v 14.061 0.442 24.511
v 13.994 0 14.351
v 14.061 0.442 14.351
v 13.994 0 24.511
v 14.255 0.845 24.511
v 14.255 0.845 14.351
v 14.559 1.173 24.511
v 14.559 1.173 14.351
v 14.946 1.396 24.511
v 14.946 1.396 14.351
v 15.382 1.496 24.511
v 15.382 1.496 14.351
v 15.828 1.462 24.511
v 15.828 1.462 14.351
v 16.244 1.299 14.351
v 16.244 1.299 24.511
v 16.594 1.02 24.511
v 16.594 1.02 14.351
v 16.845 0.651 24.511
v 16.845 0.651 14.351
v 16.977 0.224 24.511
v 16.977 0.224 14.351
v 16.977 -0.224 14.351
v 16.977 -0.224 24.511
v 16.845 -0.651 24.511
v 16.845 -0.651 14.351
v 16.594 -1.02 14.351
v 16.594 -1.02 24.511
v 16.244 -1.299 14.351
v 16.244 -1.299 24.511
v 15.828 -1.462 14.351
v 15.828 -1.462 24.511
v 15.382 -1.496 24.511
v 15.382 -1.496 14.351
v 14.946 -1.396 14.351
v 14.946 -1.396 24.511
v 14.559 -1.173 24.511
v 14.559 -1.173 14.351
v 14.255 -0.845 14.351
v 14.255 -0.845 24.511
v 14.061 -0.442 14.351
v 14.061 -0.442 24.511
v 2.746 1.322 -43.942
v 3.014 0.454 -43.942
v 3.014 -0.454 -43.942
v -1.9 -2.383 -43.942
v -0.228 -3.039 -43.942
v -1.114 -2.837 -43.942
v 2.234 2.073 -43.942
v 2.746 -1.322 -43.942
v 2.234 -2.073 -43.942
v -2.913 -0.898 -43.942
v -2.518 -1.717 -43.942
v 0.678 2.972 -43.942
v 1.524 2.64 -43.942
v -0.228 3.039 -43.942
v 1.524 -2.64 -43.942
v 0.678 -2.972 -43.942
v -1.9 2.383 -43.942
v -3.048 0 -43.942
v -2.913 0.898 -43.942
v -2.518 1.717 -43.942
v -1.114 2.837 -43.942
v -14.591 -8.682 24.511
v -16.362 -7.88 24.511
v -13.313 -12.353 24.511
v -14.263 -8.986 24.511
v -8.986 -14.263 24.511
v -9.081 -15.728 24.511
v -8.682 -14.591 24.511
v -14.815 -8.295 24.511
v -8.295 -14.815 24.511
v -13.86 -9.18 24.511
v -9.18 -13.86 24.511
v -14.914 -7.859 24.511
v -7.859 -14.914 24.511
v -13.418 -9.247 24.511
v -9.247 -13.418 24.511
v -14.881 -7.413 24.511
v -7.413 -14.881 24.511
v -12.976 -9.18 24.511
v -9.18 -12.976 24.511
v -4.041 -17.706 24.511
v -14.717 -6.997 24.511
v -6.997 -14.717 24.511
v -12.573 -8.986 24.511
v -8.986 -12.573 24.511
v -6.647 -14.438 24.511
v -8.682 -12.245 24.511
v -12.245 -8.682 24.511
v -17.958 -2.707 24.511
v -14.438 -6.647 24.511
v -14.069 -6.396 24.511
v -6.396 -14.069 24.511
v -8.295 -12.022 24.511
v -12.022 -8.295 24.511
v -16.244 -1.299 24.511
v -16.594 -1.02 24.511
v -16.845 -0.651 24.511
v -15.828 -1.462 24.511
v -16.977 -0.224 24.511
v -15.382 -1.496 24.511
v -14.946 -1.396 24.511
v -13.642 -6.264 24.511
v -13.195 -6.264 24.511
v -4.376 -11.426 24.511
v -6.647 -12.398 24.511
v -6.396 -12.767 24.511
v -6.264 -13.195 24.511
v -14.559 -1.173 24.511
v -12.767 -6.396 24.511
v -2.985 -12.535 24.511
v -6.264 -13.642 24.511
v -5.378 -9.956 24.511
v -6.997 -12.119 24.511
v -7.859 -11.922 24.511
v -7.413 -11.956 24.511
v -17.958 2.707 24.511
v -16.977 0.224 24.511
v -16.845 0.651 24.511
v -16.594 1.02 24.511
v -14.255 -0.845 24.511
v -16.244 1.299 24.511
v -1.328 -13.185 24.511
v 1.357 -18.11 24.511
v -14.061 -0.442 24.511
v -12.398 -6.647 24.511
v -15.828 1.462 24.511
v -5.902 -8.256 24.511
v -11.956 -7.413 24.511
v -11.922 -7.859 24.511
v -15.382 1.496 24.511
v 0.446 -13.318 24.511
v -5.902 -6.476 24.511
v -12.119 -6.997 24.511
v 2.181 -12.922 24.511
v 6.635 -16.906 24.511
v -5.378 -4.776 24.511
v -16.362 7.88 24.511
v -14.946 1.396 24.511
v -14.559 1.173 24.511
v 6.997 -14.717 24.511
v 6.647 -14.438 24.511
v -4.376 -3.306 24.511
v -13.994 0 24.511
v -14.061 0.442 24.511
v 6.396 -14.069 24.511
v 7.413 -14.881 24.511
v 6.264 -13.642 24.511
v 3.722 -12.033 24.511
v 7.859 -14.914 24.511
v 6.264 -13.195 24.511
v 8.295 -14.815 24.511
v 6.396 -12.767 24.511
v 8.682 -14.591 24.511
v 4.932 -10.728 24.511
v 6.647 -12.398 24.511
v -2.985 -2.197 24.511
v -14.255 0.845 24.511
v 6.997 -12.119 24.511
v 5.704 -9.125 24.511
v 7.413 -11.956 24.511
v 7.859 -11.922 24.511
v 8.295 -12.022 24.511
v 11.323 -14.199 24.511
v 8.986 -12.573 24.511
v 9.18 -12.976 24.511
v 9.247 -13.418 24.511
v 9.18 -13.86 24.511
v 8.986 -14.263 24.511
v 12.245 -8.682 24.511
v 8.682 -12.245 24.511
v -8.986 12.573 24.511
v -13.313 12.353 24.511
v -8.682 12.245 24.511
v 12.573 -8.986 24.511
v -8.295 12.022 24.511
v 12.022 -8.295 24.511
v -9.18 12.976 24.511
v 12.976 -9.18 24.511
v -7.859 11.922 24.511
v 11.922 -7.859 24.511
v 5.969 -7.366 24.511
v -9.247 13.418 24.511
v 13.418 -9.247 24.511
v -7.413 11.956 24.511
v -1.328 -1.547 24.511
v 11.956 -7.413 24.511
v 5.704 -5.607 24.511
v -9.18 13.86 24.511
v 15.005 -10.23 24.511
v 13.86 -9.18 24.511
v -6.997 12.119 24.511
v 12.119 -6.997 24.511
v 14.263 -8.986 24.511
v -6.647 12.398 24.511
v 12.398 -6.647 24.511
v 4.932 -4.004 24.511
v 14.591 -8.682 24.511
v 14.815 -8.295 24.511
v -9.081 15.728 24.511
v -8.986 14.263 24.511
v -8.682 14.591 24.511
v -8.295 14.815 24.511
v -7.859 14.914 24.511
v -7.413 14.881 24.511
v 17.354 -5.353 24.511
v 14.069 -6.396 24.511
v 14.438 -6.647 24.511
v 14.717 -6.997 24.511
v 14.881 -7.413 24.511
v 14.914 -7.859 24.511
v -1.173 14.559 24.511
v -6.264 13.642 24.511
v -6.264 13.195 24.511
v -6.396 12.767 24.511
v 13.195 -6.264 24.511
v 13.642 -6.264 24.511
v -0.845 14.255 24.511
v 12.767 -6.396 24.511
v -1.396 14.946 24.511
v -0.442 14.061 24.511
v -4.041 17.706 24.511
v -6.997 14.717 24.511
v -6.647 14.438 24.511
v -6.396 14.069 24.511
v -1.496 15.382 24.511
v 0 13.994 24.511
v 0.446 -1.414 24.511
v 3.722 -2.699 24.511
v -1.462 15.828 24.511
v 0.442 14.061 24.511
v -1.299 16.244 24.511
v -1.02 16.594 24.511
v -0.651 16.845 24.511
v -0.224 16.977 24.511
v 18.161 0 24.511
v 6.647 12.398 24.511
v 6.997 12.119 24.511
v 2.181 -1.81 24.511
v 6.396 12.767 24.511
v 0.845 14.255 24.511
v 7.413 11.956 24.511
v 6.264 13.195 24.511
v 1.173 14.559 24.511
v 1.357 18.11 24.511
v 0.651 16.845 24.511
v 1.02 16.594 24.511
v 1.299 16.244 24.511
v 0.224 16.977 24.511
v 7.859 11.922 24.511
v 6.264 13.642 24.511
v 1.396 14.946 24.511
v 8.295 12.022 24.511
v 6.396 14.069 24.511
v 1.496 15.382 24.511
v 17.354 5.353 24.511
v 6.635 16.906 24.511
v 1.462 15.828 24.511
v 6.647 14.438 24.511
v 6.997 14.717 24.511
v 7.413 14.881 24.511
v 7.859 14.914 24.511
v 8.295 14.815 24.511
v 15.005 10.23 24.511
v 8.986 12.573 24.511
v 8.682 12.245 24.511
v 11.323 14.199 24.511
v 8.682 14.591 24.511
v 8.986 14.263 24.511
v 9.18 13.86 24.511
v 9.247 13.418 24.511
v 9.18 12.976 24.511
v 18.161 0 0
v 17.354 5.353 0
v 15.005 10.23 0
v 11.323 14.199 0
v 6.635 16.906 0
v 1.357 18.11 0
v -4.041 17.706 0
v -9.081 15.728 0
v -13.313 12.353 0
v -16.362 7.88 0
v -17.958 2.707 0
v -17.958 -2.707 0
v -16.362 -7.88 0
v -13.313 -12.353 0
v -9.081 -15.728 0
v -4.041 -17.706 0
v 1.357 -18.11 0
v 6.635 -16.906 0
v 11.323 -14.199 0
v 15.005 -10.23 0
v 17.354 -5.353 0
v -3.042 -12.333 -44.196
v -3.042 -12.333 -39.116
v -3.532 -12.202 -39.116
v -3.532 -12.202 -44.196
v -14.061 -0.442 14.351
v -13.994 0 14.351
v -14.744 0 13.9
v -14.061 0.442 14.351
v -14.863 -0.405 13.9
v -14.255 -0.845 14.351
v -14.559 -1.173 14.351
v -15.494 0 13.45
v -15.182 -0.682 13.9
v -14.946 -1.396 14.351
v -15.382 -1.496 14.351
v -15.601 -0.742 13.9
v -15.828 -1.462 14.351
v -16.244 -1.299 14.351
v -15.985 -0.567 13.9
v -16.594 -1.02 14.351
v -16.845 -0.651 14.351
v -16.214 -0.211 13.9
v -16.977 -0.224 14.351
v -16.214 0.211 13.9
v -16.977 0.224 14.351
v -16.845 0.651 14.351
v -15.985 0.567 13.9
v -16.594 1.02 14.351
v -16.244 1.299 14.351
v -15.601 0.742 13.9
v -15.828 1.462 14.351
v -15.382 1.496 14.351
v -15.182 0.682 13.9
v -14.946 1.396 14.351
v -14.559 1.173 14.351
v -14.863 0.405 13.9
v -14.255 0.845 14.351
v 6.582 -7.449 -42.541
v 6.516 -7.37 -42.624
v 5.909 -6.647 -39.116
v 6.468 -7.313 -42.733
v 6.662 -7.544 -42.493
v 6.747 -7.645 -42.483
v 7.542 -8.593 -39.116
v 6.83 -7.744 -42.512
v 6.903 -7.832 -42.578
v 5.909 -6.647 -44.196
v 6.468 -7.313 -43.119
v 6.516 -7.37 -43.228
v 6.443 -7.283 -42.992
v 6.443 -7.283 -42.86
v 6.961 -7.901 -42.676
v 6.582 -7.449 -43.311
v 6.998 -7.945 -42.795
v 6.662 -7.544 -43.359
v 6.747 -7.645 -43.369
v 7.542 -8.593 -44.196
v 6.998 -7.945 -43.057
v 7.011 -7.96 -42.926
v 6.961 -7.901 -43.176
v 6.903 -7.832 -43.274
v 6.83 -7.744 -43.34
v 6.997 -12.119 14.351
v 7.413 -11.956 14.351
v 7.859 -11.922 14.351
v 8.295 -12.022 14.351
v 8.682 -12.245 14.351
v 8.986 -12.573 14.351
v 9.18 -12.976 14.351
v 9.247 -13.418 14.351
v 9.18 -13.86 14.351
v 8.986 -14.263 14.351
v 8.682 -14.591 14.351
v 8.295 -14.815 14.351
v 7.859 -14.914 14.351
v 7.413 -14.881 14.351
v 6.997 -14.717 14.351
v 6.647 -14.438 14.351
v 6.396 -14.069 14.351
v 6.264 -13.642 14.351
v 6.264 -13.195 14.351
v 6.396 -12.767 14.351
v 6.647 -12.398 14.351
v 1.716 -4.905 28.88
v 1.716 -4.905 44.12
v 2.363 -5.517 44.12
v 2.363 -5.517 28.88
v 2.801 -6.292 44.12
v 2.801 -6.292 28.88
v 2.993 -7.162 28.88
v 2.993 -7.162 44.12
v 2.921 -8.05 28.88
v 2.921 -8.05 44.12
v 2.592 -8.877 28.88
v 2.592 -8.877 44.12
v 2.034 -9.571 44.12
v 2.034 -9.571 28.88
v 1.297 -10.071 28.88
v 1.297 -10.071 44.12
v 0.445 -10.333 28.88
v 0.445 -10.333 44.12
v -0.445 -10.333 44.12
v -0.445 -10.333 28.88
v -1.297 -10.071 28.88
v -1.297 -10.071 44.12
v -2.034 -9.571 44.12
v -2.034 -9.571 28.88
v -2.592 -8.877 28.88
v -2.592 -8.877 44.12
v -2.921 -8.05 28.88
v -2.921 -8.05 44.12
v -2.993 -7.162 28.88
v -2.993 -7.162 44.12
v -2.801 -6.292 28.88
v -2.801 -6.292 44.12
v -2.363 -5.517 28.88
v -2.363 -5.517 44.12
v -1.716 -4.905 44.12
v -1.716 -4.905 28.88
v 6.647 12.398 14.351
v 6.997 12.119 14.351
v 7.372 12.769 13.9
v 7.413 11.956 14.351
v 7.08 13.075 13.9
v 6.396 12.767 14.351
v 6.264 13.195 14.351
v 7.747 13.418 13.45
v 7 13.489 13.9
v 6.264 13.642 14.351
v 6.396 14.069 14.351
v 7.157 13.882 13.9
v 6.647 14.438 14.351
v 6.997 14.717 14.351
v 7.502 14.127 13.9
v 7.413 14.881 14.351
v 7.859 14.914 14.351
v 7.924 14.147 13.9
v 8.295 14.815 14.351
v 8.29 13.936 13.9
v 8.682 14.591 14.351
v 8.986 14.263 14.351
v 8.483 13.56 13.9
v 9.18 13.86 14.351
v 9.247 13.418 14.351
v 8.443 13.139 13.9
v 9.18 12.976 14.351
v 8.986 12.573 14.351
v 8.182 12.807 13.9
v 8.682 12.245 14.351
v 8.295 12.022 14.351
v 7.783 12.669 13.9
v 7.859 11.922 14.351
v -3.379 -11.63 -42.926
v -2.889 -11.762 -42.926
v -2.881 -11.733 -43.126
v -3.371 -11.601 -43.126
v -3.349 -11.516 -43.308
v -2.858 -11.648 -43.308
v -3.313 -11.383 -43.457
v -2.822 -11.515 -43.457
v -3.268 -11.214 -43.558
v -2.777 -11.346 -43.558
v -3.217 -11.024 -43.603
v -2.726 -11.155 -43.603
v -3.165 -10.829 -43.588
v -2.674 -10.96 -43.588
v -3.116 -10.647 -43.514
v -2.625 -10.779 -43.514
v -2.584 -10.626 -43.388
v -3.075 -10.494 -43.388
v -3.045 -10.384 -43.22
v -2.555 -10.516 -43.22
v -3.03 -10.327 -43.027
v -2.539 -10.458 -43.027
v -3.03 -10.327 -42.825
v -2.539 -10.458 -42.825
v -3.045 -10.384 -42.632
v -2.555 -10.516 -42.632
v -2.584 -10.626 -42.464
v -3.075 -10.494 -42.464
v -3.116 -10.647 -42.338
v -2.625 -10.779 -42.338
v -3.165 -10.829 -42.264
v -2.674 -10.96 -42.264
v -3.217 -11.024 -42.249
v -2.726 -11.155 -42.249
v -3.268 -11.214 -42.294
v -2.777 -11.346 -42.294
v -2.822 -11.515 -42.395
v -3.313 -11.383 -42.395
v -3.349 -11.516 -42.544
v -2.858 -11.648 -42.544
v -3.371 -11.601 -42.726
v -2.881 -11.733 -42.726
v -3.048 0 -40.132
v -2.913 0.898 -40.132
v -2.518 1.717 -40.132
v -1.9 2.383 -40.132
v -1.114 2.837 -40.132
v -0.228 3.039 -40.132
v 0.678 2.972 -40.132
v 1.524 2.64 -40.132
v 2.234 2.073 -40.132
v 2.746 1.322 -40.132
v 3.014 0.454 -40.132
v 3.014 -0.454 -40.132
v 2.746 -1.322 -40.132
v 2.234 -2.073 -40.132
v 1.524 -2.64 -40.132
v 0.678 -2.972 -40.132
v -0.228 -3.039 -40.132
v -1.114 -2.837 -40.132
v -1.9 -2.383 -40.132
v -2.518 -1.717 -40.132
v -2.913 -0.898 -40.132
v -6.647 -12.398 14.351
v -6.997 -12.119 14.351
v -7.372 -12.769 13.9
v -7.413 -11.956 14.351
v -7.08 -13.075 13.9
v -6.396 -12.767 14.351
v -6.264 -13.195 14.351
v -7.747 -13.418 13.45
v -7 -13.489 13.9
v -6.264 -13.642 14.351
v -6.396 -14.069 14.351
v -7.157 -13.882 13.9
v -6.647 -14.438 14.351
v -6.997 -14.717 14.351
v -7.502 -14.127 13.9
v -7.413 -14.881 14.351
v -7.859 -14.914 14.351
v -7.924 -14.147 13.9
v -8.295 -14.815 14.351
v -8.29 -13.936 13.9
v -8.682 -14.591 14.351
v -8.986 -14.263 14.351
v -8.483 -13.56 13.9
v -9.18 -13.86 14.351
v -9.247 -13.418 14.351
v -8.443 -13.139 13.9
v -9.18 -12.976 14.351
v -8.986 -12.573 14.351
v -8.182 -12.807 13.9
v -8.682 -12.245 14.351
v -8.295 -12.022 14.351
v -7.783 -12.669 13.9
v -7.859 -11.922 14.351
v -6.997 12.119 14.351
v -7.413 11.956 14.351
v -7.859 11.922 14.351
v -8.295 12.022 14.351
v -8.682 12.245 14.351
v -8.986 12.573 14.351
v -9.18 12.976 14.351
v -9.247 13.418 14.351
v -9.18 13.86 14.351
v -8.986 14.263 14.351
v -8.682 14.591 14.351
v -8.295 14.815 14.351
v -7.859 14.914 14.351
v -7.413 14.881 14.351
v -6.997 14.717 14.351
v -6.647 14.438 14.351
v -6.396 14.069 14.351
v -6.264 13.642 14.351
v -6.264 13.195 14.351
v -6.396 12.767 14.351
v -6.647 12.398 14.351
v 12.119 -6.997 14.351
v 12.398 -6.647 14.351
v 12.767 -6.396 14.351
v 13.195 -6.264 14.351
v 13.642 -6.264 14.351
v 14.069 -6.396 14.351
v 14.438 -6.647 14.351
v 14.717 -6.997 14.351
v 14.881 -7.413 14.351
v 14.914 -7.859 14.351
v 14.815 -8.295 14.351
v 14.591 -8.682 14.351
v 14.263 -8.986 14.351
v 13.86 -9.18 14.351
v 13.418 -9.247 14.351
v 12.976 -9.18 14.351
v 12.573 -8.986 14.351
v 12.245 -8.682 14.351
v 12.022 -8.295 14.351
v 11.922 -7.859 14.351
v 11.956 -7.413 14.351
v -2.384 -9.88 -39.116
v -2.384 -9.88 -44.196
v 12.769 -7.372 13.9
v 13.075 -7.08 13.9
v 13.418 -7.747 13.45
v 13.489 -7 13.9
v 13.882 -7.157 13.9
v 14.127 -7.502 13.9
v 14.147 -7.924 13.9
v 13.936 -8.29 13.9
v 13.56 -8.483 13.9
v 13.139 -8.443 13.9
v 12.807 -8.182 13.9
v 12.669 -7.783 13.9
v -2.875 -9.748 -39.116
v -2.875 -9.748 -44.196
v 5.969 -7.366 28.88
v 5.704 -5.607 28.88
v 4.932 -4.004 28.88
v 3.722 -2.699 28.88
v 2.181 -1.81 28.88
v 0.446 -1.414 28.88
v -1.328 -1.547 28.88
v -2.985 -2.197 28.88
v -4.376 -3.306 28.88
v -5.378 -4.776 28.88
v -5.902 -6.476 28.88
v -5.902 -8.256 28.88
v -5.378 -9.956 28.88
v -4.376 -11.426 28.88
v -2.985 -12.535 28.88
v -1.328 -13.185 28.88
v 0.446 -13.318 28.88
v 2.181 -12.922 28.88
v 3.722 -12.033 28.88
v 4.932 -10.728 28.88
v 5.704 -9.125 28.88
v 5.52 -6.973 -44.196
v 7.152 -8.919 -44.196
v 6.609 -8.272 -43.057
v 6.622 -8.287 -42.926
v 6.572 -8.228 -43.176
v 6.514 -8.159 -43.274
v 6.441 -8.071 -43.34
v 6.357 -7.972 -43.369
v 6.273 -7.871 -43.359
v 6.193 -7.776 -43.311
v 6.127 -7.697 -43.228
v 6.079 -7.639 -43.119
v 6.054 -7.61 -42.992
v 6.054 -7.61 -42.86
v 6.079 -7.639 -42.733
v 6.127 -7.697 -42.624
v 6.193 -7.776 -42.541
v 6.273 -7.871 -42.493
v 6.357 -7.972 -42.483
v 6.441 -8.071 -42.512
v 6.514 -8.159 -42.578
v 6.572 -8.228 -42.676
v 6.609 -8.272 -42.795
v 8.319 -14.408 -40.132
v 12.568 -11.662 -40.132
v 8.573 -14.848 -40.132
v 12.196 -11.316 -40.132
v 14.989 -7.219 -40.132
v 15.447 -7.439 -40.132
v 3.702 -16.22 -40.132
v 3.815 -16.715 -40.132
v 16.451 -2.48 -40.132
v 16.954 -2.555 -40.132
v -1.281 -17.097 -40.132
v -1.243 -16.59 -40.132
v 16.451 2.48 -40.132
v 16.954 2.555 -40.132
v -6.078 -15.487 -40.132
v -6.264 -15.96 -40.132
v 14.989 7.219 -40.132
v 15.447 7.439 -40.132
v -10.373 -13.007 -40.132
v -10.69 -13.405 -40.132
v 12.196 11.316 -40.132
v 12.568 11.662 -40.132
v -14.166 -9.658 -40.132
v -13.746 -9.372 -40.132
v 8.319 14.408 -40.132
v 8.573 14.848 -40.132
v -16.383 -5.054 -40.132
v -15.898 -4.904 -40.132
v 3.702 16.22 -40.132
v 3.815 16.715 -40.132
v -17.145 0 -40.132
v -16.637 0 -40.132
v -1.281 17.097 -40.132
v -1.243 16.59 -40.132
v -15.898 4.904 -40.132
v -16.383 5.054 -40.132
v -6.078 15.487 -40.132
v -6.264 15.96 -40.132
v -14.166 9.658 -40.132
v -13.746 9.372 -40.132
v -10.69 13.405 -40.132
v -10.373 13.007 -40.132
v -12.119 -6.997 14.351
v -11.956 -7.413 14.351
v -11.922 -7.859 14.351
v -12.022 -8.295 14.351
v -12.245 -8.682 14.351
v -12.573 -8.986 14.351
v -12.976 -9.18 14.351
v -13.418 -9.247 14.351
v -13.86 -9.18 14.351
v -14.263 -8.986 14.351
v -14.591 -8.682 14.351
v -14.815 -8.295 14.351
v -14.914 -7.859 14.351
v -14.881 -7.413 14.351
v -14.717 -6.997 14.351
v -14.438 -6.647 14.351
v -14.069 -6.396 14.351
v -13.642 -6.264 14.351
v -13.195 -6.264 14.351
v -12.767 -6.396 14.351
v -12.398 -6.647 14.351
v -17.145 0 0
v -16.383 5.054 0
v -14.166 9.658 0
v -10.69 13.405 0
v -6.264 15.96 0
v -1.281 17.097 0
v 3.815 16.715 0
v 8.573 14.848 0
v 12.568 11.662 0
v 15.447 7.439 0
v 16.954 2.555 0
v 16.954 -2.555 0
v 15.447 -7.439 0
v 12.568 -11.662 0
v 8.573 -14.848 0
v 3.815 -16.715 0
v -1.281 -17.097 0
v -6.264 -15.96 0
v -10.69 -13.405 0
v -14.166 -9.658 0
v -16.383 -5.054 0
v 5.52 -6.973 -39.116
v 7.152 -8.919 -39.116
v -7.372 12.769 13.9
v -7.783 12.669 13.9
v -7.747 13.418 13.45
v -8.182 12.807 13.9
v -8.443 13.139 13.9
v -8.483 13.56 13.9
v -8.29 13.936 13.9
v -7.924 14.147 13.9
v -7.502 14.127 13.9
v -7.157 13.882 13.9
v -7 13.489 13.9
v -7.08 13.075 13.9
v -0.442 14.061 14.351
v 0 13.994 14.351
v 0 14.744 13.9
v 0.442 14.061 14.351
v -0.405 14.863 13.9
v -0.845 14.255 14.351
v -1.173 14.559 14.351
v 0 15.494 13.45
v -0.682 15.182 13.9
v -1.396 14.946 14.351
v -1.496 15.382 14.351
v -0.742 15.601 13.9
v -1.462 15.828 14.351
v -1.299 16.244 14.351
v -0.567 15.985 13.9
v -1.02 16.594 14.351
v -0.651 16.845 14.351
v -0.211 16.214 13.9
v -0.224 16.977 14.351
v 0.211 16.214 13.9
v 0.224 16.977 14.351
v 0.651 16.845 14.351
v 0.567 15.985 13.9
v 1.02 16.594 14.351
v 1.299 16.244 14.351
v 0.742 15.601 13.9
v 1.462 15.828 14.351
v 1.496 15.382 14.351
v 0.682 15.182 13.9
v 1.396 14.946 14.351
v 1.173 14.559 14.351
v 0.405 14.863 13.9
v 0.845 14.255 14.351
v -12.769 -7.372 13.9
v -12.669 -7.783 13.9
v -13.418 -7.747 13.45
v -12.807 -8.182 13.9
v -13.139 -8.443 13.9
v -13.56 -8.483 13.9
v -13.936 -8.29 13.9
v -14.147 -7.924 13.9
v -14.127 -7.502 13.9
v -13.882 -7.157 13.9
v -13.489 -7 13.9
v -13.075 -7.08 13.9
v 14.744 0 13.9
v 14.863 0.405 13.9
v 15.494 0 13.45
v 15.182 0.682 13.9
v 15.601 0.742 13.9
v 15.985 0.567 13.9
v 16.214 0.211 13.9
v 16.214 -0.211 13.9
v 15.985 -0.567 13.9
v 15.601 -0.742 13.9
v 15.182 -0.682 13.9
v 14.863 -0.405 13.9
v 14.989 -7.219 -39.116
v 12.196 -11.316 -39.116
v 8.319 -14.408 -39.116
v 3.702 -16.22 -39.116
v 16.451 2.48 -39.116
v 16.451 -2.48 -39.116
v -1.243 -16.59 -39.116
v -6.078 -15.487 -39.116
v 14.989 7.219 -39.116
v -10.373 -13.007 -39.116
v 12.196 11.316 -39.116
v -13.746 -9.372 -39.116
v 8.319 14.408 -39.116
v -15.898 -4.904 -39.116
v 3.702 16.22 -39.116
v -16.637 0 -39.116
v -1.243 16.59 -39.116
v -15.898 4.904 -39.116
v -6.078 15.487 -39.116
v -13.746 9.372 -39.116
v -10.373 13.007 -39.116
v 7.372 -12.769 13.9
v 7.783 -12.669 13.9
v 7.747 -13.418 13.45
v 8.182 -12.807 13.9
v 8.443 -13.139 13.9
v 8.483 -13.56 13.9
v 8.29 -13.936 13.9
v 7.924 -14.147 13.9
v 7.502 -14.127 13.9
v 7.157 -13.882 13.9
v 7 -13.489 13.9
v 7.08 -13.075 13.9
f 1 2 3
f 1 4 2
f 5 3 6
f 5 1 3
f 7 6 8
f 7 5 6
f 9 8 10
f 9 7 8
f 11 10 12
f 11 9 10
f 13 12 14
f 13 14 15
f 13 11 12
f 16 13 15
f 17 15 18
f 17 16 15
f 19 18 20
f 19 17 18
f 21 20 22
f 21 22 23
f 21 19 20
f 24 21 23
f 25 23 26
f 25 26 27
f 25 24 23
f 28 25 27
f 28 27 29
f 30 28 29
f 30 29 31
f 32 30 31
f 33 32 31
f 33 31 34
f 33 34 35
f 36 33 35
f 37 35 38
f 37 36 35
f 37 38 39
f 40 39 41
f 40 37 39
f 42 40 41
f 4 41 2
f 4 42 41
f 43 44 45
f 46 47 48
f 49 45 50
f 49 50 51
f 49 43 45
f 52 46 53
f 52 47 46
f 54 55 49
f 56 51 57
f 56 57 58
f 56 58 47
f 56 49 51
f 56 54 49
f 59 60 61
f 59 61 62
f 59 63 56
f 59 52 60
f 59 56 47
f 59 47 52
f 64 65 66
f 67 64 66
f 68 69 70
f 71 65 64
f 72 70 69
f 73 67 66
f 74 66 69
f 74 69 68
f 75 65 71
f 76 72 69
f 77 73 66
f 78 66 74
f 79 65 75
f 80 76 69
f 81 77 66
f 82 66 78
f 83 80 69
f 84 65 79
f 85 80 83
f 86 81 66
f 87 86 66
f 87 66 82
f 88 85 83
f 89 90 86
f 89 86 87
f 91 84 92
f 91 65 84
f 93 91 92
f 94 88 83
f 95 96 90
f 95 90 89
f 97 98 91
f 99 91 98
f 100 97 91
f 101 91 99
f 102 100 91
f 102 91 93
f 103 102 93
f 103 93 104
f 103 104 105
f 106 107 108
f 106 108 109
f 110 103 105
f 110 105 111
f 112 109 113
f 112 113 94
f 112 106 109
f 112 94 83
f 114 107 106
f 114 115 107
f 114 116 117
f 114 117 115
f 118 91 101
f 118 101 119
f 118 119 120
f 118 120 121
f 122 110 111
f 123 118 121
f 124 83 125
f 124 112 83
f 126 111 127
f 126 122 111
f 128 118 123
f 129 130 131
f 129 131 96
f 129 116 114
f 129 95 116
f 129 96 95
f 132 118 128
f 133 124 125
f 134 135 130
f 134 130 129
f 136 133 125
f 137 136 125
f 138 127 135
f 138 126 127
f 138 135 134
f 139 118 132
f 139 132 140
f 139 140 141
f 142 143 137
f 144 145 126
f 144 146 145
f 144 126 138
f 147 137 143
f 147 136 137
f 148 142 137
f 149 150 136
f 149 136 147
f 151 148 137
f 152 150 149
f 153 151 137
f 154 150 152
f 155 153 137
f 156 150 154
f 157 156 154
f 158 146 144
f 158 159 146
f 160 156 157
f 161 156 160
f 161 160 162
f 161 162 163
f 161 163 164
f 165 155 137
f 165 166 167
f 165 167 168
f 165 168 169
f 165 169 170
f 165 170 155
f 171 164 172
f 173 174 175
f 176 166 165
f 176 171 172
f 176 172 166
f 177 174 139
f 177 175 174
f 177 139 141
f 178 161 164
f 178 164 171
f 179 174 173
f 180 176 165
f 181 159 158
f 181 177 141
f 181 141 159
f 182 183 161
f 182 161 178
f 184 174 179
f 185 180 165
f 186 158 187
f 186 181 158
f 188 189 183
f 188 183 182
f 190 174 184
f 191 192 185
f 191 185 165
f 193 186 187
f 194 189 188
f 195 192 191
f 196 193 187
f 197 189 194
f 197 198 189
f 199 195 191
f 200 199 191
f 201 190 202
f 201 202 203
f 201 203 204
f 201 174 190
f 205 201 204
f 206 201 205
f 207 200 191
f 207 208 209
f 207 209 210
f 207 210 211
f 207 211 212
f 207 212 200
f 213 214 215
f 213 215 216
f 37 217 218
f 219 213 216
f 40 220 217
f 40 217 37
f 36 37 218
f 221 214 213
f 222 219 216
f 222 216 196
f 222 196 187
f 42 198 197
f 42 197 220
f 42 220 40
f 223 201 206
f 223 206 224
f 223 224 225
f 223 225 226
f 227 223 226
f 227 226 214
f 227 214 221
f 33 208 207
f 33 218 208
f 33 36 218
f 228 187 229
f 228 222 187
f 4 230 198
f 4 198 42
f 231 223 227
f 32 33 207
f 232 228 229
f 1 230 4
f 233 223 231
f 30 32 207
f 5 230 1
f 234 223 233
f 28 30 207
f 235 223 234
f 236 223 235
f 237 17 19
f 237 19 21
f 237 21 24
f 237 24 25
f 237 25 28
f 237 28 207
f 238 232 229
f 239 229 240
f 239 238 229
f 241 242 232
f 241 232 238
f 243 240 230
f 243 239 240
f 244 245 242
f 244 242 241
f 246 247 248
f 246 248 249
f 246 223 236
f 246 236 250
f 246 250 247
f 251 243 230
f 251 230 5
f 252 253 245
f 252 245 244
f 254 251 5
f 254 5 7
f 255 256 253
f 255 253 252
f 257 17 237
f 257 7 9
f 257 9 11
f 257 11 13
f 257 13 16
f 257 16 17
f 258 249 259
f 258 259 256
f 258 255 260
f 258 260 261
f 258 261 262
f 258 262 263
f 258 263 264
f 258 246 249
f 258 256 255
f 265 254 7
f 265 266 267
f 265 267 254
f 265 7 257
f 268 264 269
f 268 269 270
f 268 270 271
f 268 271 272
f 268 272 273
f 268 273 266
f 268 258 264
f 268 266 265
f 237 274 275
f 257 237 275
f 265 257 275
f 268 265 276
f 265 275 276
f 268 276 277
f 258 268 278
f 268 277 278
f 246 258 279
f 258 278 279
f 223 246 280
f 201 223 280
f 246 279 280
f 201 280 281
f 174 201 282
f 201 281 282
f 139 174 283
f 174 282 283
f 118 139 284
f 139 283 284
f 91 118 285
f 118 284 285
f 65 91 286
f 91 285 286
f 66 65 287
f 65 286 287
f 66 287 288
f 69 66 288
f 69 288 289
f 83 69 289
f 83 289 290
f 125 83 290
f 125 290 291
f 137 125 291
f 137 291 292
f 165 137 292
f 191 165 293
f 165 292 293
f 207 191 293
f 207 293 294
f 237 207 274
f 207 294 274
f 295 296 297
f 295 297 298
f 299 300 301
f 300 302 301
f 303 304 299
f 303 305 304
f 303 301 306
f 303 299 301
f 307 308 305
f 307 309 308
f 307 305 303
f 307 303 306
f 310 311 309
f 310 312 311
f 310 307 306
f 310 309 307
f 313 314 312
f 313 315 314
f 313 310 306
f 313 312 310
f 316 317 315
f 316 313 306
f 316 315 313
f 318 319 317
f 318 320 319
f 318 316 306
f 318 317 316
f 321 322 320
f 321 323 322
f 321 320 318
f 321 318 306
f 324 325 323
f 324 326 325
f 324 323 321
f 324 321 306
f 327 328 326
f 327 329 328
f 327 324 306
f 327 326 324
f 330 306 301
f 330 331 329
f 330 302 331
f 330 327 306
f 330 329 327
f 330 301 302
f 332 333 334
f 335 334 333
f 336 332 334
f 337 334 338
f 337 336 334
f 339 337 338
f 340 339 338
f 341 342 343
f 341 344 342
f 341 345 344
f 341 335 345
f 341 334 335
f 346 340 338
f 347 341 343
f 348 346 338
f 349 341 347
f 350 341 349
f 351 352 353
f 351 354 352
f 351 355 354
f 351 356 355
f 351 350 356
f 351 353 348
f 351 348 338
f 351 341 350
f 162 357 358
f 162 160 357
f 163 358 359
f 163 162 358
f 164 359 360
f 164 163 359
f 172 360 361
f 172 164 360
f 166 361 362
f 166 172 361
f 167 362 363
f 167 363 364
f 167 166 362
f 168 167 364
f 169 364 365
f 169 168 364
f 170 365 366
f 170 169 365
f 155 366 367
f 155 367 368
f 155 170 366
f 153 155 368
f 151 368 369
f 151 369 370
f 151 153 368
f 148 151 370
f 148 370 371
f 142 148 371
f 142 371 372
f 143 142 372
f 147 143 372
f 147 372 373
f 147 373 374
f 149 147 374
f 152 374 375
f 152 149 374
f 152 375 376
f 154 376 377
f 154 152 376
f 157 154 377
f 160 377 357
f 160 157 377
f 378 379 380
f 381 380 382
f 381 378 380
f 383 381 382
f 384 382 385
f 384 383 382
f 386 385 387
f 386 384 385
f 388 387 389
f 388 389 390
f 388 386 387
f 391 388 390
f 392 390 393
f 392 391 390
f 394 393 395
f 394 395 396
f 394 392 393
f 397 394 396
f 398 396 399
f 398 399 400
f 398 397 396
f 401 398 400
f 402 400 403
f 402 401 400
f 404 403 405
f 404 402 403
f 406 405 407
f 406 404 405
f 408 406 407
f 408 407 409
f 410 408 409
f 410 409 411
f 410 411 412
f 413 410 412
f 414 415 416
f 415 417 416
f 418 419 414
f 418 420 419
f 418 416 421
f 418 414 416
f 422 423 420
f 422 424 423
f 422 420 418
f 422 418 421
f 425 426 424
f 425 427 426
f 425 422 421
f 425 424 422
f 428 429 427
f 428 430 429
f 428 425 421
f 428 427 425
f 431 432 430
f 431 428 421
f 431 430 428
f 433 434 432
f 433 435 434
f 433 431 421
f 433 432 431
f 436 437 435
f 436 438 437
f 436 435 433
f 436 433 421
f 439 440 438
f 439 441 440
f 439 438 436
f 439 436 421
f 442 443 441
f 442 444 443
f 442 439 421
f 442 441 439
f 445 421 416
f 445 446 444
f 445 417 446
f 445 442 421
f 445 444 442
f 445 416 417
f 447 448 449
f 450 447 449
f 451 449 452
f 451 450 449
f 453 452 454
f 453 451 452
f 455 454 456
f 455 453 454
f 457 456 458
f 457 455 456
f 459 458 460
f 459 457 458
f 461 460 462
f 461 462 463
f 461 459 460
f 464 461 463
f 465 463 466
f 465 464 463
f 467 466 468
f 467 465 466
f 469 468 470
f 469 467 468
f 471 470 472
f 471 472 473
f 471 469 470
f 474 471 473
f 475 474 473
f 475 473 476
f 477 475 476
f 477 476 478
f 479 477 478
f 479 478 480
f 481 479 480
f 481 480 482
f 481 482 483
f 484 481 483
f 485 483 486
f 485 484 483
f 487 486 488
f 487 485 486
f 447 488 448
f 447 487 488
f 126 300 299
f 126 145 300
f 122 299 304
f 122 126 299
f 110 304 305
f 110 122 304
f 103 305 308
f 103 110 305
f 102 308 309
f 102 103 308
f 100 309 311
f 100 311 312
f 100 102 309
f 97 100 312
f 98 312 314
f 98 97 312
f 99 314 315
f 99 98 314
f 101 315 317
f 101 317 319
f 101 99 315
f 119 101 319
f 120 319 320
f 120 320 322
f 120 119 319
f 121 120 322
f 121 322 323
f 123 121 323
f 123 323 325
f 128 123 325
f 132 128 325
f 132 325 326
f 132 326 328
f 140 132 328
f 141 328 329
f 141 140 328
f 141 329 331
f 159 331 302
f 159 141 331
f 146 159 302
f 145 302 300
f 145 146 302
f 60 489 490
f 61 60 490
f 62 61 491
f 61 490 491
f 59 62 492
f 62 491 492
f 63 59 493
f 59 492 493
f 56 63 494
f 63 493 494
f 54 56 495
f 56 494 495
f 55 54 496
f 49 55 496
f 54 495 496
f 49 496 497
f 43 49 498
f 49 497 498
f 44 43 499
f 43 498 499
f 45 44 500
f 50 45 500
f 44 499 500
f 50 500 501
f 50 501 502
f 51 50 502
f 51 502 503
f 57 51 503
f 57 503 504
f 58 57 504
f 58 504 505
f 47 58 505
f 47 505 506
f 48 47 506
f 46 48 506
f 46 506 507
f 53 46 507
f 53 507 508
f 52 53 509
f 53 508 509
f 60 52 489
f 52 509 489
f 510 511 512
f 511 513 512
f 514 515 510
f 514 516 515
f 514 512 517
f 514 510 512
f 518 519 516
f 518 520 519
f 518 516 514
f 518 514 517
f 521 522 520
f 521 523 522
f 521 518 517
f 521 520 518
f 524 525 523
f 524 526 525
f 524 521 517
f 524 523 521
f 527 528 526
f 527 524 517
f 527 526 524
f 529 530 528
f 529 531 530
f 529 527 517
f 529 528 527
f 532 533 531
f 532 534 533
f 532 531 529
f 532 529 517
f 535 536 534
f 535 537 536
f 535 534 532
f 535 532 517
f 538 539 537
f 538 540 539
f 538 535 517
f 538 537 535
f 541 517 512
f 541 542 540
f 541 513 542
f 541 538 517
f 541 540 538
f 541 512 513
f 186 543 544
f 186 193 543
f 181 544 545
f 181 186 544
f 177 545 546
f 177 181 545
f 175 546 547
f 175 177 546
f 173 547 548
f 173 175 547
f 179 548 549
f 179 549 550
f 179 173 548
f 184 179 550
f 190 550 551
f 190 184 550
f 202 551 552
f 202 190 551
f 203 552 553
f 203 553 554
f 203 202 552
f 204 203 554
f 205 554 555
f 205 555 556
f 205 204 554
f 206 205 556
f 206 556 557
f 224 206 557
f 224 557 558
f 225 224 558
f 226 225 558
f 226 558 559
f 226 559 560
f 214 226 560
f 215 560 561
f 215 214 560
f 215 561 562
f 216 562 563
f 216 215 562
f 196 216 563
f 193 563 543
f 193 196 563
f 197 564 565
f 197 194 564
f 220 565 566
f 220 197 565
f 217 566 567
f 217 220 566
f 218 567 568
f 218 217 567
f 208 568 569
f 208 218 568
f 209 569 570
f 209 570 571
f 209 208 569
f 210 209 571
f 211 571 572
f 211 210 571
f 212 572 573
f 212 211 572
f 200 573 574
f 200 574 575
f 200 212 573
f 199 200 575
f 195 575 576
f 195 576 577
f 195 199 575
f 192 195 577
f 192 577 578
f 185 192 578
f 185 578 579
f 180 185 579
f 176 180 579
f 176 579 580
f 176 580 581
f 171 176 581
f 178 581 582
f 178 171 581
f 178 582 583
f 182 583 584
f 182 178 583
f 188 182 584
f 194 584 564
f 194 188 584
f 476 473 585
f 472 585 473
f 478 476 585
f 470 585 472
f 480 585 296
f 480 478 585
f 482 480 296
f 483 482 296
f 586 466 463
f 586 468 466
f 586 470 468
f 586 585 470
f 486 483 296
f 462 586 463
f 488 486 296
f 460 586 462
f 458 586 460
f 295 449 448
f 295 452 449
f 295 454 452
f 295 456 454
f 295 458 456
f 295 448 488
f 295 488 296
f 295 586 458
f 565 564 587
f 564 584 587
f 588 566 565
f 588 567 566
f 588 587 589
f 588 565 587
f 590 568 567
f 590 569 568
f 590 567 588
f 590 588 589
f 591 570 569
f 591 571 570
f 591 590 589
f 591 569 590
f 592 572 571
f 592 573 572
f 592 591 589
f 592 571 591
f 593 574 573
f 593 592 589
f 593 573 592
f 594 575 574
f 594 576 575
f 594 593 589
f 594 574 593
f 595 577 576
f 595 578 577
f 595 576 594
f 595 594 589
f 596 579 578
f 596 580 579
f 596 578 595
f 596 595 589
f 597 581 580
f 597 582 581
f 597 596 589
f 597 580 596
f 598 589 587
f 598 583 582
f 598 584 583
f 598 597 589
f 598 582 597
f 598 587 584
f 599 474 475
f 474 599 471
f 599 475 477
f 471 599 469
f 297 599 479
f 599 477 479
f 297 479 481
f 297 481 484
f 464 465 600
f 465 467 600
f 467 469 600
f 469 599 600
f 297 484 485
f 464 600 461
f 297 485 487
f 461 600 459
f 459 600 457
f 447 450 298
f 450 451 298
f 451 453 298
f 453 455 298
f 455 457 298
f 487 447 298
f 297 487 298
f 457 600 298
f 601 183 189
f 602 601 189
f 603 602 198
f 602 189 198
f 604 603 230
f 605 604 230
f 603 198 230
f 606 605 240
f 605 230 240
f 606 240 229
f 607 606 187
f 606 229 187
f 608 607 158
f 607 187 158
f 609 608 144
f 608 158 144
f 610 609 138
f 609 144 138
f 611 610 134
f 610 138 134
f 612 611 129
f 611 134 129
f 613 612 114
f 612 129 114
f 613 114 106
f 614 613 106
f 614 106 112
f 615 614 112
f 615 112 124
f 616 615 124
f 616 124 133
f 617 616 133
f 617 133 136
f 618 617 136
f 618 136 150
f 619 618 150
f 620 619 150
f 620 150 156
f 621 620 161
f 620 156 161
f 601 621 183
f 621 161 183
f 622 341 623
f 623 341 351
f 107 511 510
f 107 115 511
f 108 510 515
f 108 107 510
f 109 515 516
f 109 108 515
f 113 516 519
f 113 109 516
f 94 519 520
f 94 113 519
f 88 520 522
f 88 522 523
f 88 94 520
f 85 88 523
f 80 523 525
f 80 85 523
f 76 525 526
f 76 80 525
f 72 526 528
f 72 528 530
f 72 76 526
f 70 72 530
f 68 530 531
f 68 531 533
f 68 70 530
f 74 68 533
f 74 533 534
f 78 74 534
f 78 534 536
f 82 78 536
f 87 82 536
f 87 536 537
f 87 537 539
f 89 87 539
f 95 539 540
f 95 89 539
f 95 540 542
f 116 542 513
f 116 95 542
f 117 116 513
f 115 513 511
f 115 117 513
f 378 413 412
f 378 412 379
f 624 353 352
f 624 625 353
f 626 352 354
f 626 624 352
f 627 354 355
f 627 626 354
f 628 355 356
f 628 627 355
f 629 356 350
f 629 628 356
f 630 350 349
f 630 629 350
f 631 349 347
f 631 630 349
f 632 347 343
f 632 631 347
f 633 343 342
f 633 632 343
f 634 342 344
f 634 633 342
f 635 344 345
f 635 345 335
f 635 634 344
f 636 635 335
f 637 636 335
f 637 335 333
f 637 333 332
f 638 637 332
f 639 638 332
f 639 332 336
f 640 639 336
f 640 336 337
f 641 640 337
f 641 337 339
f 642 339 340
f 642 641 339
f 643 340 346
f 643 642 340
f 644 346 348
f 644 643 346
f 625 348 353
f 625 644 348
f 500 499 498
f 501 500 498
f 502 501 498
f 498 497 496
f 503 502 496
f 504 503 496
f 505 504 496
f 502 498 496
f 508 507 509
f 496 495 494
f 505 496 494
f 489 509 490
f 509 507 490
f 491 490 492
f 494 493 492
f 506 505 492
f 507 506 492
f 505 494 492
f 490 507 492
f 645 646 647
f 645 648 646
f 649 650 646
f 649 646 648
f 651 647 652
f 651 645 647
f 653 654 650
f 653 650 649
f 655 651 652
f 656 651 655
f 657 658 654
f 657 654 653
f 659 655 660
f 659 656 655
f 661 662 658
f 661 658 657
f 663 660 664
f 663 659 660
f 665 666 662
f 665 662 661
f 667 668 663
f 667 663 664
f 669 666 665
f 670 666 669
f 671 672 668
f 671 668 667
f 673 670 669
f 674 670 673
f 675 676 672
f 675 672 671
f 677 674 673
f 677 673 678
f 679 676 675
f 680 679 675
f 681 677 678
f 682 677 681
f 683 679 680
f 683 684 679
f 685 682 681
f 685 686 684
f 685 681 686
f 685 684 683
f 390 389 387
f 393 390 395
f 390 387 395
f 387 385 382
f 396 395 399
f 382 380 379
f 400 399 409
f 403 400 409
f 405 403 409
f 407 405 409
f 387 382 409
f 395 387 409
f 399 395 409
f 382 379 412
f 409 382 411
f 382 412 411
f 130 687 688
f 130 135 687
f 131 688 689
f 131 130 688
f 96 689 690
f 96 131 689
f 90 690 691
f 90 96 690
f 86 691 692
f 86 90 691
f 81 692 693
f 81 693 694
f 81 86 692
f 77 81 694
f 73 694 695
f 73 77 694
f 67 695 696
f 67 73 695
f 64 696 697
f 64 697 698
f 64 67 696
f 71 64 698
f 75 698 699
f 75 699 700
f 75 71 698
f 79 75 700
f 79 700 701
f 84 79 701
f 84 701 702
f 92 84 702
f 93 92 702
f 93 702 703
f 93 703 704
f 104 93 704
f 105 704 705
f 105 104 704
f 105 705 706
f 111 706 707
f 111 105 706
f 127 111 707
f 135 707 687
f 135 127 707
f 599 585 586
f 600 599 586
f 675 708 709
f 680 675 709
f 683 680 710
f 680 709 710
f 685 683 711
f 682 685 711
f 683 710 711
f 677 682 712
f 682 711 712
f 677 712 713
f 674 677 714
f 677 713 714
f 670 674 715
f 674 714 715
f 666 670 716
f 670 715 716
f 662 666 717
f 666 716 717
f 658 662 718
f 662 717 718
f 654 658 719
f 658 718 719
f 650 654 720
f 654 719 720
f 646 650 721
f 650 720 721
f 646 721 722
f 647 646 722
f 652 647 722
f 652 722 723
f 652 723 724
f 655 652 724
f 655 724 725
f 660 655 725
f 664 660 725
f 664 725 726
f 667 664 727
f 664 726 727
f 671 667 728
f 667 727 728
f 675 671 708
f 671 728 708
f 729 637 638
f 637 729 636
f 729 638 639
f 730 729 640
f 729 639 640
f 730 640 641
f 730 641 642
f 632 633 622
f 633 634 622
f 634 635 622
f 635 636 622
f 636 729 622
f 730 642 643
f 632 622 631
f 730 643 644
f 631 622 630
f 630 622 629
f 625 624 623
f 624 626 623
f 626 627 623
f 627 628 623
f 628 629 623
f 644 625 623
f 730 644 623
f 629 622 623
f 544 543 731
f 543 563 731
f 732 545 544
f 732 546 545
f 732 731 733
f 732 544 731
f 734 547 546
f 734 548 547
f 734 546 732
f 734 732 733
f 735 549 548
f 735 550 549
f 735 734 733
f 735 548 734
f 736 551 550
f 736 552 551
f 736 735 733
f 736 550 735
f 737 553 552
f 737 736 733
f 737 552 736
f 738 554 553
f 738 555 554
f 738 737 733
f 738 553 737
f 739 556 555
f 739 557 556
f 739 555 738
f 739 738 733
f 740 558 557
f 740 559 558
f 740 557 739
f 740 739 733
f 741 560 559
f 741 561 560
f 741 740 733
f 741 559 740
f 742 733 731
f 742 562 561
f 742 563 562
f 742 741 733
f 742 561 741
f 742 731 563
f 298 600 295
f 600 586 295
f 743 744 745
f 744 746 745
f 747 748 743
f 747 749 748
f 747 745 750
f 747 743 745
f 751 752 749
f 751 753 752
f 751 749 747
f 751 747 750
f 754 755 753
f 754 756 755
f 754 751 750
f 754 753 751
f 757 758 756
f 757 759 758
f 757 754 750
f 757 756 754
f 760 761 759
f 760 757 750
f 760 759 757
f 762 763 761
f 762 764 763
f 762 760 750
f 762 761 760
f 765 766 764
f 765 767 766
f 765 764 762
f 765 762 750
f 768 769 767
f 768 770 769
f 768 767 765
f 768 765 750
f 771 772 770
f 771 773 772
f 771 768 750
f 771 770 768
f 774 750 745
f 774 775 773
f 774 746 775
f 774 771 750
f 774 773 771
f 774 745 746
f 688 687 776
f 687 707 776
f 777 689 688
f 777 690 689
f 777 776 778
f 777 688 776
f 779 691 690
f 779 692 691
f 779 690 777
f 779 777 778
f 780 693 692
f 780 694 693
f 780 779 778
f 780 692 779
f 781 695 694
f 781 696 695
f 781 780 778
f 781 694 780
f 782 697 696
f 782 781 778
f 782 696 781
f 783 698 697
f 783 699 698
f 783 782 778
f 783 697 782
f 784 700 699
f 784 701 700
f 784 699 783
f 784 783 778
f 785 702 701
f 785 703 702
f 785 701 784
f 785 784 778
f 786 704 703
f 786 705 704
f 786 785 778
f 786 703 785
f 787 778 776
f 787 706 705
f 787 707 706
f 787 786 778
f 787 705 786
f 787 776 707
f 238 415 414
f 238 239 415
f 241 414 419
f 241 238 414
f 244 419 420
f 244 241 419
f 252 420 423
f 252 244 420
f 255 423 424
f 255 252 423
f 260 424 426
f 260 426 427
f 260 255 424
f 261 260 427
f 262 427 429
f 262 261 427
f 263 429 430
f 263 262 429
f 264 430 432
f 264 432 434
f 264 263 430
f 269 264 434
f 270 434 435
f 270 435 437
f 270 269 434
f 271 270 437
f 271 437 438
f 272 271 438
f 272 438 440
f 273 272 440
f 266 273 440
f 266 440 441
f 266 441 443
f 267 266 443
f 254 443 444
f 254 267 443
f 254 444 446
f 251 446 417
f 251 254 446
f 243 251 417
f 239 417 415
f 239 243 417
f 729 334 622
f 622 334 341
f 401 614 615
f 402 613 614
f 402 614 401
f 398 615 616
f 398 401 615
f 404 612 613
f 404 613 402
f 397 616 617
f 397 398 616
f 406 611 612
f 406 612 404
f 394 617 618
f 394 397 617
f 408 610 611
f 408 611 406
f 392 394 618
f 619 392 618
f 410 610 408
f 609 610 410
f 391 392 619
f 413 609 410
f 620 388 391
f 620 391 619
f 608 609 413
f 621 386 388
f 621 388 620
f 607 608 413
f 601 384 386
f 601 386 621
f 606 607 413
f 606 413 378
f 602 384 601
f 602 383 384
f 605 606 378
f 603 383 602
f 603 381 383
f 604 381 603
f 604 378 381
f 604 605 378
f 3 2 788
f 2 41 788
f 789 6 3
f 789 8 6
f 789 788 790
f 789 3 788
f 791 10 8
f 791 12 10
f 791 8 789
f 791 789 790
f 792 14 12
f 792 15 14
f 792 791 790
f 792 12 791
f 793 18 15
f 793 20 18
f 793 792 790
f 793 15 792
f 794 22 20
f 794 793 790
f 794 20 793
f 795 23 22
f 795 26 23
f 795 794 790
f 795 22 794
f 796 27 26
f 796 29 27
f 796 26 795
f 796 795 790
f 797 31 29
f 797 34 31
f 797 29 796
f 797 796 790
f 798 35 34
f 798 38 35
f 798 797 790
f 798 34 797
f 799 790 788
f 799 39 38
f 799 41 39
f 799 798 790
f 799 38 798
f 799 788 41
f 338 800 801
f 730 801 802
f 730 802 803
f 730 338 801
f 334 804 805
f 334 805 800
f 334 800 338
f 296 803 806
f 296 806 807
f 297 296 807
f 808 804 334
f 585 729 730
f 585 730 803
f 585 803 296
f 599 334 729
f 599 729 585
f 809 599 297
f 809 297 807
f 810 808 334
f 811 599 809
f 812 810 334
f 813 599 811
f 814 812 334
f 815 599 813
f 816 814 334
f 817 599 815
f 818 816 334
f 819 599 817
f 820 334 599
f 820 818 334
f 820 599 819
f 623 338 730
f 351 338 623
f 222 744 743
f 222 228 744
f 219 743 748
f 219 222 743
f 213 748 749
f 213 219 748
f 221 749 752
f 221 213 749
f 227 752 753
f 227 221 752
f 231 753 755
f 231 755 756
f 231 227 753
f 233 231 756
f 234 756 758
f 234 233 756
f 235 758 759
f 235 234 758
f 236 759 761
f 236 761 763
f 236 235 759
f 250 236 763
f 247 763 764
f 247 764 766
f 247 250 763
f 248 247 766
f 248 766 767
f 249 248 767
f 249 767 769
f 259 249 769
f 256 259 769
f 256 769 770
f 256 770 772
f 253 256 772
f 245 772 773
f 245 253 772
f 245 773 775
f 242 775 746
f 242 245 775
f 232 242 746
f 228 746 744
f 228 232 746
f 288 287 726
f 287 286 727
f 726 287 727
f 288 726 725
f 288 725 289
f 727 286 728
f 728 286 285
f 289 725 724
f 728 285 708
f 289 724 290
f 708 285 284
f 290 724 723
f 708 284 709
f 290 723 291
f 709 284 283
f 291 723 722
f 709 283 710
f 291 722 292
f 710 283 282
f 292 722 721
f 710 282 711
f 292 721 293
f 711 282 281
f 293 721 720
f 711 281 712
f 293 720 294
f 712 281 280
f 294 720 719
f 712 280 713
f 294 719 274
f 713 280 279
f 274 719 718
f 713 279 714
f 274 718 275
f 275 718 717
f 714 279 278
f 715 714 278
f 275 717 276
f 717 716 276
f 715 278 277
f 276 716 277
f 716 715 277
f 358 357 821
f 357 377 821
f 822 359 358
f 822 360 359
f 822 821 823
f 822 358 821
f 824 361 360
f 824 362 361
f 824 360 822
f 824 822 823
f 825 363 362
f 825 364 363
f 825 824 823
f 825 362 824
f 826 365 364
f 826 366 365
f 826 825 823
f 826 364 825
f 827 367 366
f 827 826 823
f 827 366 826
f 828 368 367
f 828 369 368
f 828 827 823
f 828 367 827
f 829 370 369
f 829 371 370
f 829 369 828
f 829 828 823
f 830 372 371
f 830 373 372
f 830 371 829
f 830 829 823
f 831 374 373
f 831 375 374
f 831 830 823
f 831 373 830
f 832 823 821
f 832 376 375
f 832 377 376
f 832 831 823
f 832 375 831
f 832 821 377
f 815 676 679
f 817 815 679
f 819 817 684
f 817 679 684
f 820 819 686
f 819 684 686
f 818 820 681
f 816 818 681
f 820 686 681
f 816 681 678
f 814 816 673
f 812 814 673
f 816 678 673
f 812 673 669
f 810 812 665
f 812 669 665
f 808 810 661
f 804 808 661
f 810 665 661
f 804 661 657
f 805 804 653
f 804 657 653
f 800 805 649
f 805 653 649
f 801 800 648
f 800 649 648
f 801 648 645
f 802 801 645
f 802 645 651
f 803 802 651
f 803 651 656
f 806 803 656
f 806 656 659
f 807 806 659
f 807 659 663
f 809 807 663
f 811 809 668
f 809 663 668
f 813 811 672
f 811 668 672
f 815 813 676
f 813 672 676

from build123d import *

# Parameters (mm, degrees)
SKETCH1_R           = 18.161
BOSS_EXTRUDE1_DEPTH = 24.511
SKETCH5_R           = 5.969
BOSS_EXTRUDE5_DEPTH = 4.3688
BOSS_EXTRUDE6_DEPTH = 15.24
CIRPATTERN2_COUNT   = 12
SKETCH2_R           = 17.145
BOSS_EXTRUDE2_DEPTH = 40.132
SKETCH3_R           = 3.048
BOSS_EXTRUDE3_DEPTH = 3.81
SKETCH13_R          = 16.637
CUT_EXTRUDE1_DEPTH  = 1.016
SKETCH15_W          = 2.54
SKETCH15_H          = 5.08
SKETCH15_R          = 0.4445
BOSS_EXTRUDE7_DEPTH = 0.254
SKETCH16_W          = 2.54
SKETCH16_H          = 5.08
SKETCH16_R          = 0.678606607
BOSS_EXTRUDE8_DEPTH = 0.254


with BuildPart() as part:
    # Sketch1 → Boss-Extrude1 (new body)
    with BuildSketch(Plane.XY):
        Circle(SKETCH1_R)
    extrude(amount=BOSS_EXTRUDE1_DEPTH)

    # Sketch5 → Boss-Extrude5 (add)
    with BuildSketch(Plane.XY.offset(24.511)):
        with Locations((0, -7.366)):
            Circle(SKETCH5_R)
    extrude(amount=BOSS_EXTRUDE5_DEPTH)

    # Sketch6 → Boss-Extrude6 (add)
    with BuildSketch(Plane.XY.offset(28.8798)):
        with BuildLine():
            Line((-1.715657017, -4.905), (1.715657017, -4.905))
            ThreePointArc((1.715657017, -4.905), (0, -10.366), (-1.715657017, -4.905))
        make_face()
    extrude(amount=BOSS_EXTRUDE6_DEPTH)

    # Sketch12 → Ø3.0mm Dowel Hole1 (revolve, cut)
    with BuildSketch(Plane(origin=(0, 15.494, 24.511), x_dir=(0, -1, 0), z_dir=(1, 0, 0))):
        Polygon((0, 0), (0, 11.061290929), (1.5, 10.16), (1.5, 0), align=None)
    f_3_0mm_dowel_hole1 = revolve(axis=Axis((0, 15.494, 30.861), (0, 0, -1)), mode=Mode.SUBTRACT)

    # CirPattern2: Ø3.0mm Dowel Hole1 ×12 about axis, 3 skipped
    cirpattern2_axis = Axis((0, 0, 0), (0, 0, -1))
    add([f_3_0mm_dowel_hole1.rotate(cirpattern2_axis, i * 360 / CIRPATTERN2_COUNT) for i in range(1, CIRPATTERN2_COUNT) if i not in (2, 6, 10)], mode=Mode.SUBTRACT)

    # Sketch2 → Boss-Extrude2 (add)
    with BuildSketch(Plane(origin=(0, 0, 0), x_dir=(-1, 0, 0), z_dir=(0, 0, -1))):
        Circle(SKETCH2_R)
    extrude(amount=BOSS_EXTRUDE2_DEPTH)

    # Sketch3 → Boss-Extrude3 (add)
    with BuildSketch(Plane(origin=(0, 0, -40.132), x_dir=(-1, 0, 0), z_dir=(0, 0, -1))):
        Circle(SKETCH3_R)
    extrude(amount=BOSS_EXTRUDE3_DEPTH)

    # Sketch13 → Cut-Extrude1 (cut)
    with BuildSketch(Plane(origin=(0, 0, -40.132), x_dir=(-1, 0, 0), z_dir=(0, 0, -1))):
        Circle(SKETCH13_R)
    extrude(amount=-CUT_EXTRUDE1_DEPTH, mode=Mode.SUBTRACT)

    # Sketch15 → Boss-Extrude7 (add, symmetric)
    with BuildSketch(Plane(origin=(0, 0, 0), x_dir=(0.64278761, -0.766044443, 0), z_dir=(0.766044443, 0.64278761, 0))):
        with Locations((10.16, 41.656)):
            Rectangle(SKETCH15_W, SKETCH15_H)
        with Locations((10.16, 42.926)):
            Circle(SKETCH15_R, mode=Mode.SUBTRACT)
    extrude(amount=BOSS_EXTRUDE7_DEPTH, both=True)

    # Sketch16 → Boss-Extrude8 (add, symmetric)
    with BuildSketch(Plane(origin=(0, 0, 0), x_dir=(-0.258819045, -0.965925826, 0), z_dir=(0.965925826, -0.258819045, 0))):
        with Locations((11.43, 41.656)):
            Rectangle(SKETCH16_W, SKETCH16_H)
        with Locations((11.43, 42.926)):
            Circle(SKETCH16_R, mode=Mode.SUBTRACT)
    extrude(amount=BOSS_EXTRUDE8_DEPTH, both=True)


solid = part.part
